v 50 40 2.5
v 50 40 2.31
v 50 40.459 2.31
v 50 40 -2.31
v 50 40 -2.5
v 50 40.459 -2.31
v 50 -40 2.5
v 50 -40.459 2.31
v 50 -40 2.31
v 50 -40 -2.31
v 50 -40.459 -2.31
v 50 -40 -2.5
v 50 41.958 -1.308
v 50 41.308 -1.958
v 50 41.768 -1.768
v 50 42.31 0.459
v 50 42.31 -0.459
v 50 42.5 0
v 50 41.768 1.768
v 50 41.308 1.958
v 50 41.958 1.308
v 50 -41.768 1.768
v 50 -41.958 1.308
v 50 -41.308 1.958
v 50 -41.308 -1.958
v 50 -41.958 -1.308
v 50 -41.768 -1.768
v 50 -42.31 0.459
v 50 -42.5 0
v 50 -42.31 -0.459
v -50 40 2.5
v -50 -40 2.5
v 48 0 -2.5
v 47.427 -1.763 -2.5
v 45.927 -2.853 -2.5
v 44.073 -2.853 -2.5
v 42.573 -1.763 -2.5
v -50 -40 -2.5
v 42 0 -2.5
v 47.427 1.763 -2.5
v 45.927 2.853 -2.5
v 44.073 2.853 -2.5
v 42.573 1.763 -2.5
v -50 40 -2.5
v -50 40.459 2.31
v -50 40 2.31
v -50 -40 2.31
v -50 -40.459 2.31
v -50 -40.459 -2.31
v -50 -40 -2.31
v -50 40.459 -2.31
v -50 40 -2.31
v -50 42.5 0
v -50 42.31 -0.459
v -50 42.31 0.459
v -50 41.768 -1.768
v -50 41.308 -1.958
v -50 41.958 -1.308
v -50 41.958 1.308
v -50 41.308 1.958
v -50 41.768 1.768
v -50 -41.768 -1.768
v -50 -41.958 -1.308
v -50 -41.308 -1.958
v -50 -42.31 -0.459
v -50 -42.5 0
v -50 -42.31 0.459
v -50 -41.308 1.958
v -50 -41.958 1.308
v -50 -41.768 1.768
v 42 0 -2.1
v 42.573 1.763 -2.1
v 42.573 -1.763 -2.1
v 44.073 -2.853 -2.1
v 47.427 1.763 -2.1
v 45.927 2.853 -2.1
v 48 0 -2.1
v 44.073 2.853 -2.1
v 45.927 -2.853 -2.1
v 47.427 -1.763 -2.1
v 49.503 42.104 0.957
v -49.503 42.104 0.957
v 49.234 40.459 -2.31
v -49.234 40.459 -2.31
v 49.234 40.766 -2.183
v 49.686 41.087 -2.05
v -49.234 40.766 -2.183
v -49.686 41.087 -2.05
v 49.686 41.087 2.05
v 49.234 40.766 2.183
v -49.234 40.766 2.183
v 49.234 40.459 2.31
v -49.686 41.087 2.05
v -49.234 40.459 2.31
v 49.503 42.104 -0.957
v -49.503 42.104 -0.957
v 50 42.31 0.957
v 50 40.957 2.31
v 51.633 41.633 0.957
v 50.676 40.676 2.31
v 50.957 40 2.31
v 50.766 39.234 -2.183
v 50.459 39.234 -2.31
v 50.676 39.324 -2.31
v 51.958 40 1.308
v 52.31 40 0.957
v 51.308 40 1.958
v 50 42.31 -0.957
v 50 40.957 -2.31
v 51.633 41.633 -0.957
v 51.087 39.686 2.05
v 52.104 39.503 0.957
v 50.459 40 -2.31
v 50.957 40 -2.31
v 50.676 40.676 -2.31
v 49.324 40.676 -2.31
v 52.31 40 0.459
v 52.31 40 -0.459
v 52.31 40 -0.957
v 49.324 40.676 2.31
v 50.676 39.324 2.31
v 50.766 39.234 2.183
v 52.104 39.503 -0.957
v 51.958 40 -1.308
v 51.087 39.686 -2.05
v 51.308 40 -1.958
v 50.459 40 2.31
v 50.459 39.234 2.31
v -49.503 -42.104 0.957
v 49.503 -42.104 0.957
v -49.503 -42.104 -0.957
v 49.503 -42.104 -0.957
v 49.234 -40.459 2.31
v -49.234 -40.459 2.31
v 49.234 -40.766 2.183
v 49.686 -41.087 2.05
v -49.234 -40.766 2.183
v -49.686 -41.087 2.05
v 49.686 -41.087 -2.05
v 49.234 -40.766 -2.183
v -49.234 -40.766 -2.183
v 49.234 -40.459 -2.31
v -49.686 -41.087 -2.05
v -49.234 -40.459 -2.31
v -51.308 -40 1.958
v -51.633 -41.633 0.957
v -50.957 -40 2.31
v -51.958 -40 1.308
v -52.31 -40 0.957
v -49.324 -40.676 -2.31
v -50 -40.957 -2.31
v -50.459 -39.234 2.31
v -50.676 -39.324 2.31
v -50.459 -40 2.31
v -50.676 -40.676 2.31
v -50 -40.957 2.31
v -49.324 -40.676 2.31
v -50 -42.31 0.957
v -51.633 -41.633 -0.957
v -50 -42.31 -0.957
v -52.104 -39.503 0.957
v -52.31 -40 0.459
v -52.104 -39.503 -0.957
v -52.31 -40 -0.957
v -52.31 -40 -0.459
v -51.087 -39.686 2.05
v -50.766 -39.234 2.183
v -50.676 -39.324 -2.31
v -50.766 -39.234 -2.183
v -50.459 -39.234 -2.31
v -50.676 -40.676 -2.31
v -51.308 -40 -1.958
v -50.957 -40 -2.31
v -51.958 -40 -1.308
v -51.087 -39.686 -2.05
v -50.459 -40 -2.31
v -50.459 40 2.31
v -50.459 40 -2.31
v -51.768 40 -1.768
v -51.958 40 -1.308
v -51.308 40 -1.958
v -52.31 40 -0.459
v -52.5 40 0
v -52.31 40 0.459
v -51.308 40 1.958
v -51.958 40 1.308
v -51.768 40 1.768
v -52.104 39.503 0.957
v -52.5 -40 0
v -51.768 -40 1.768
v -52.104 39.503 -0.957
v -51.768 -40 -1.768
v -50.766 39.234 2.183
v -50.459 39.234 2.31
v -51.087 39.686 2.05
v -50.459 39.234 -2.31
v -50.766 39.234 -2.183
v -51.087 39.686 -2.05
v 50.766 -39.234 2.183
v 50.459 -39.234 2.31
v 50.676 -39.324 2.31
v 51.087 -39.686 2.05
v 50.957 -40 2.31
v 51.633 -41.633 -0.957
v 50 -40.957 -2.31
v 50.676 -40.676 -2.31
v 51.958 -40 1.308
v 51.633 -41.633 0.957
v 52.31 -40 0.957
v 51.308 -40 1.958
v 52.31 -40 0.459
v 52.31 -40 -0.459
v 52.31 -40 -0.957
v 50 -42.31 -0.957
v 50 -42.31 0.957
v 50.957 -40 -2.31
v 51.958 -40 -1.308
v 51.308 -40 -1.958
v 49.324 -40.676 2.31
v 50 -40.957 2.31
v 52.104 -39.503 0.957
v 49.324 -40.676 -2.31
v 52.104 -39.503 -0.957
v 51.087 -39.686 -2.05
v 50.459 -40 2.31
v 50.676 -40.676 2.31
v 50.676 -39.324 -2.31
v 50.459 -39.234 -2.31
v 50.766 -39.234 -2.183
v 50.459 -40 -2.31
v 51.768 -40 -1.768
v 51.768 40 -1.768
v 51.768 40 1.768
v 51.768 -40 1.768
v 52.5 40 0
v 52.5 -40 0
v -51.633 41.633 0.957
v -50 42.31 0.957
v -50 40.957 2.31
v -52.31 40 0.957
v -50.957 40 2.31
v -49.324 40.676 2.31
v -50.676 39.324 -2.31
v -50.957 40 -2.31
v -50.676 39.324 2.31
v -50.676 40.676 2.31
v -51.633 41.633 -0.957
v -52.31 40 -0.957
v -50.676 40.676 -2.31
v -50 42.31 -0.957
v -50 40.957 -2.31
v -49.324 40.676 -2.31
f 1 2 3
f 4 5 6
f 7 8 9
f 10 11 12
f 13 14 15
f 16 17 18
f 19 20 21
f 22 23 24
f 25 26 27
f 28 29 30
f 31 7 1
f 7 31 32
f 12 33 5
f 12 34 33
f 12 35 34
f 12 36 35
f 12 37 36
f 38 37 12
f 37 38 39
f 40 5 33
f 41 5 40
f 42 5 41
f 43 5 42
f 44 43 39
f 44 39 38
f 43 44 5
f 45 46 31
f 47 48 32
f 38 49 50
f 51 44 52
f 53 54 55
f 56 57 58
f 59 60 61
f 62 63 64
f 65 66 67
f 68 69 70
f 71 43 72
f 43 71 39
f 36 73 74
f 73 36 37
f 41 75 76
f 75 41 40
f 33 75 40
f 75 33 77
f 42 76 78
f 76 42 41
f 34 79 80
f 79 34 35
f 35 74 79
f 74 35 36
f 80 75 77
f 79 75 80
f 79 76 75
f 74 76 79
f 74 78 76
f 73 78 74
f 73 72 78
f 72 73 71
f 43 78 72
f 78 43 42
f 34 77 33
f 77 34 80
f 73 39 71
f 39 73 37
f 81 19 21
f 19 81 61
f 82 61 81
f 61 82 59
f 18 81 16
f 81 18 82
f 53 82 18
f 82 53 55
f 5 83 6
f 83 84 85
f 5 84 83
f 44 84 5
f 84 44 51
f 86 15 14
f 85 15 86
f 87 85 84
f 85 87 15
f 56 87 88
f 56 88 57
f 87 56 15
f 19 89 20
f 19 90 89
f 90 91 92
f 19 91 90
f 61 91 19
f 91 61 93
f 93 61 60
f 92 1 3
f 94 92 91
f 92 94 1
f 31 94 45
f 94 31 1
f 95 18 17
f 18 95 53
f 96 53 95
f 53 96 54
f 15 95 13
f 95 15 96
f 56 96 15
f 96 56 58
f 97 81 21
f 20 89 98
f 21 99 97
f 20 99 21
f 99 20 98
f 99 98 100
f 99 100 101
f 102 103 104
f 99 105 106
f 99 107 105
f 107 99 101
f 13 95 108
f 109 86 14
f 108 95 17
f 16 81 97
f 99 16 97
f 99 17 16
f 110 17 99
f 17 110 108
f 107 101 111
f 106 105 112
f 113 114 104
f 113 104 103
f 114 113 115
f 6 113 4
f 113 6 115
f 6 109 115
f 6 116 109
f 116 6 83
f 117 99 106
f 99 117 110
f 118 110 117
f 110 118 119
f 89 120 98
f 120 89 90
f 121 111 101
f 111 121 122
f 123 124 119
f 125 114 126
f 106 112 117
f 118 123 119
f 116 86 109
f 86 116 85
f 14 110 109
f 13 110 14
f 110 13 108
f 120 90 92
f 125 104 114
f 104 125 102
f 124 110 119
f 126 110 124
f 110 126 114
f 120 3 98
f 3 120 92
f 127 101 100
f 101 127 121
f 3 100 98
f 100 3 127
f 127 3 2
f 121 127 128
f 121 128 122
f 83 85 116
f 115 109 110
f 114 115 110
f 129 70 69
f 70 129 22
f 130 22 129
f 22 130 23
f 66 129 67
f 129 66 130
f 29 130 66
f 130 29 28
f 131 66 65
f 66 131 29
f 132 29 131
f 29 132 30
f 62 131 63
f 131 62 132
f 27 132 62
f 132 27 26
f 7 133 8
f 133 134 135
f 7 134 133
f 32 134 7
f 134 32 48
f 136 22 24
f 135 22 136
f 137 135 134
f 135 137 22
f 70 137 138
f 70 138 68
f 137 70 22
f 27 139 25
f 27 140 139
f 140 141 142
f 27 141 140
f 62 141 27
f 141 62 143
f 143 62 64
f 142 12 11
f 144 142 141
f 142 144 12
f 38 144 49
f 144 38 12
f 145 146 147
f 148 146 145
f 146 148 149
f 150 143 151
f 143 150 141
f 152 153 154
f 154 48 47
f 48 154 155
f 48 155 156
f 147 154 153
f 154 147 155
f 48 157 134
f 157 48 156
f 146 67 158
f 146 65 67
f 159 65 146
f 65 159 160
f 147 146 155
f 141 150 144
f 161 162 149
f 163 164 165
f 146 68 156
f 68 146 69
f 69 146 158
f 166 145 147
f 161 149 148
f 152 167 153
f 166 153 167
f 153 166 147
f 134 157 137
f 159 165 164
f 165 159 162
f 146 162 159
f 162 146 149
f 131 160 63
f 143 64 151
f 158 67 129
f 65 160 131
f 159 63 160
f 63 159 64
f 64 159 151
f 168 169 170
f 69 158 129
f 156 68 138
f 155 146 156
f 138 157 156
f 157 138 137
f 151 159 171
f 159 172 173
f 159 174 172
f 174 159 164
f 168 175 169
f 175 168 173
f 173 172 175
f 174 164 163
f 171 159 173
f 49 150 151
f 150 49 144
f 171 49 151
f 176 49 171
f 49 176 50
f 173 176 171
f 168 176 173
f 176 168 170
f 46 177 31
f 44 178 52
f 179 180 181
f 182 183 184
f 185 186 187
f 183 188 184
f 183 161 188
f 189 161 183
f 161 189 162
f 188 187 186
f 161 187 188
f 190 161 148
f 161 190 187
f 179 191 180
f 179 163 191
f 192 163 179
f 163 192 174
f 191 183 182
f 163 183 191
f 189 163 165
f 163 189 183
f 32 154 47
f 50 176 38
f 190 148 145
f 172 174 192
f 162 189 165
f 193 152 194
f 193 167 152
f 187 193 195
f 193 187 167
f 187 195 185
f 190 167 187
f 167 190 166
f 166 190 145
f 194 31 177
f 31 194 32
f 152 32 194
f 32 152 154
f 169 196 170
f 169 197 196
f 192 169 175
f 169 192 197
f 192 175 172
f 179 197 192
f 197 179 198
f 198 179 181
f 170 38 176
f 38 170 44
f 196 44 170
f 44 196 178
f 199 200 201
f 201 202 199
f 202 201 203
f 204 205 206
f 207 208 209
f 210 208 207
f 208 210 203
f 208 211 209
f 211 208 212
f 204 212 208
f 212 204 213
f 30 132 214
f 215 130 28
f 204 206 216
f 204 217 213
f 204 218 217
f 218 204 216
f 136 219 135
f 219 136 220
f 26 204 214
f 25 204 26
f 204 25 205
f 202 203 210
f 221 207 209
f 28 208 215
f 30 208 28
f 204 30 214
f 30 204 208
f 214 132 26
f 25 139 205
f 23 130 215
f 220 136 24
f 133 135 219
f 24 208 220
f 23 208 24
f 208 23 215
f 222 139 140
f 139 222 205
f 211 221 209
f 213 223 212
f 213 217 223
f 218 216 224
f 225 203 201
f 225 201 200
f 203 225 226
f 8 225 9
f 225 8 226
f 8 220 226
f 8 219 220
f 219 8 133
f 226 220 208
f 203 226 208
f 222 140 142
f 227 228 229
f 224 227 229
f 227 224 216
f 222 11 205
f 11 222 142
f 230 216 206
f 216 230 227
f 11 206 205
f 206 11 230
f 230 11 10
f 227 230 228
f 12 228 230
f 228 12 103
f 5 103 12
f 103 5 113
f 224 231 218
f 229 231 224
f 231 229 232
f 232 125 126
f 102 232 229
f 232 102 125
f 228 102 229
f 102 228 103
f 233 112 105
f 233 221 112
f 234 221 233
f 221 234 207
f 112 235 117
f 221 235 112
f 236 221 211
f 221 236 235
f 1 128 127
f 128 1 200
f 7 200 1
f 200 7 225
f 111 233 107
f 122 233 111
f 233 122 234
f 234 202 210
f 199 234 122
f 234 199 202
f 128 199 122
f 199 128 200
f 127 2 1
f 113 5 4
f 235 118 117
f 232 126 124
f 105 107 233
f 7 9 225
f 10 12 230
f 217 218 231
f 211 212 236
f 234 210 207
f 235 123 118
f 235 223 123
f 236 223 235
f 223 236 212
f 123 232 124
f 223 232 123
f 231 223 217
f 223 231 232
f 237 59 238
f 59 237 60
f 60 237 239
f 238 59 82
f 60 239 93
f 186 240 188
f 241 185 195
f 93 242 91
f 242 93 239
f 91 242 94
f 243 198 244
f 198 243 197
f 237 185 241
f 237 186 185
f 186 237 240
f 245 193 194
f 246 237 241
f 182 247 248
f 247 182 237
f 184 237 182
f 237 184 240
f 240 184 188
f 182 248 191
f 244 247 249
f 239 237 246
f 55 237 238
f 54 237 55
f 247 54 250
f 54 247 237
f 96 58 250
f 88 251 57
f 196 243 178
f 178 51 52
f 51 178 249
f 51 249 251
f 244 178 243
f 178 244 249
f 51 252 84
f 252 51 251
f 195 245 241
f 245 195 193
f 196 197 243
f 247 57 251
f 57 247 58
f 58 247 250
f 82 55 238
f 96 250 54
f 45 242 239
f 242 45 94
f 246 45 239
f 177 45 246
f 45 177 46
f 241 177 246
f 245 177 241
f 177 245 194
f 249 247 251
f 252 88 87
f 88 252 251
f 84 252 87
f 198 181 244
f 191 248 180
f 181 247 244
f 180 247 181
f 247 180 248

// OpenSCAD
use <Write.scad>
width = 5;
small = width/2;

difference() {
	cube([100,80,width], center=true);

	
	translate([40,0,small])
	rotate([0,0,90])
		write("goodboard",center=true,space=2.5);

	translate([45,0,small])
	rotate([0,0,90])
		write("made in cascadia",h=1,center=true,space=2.5);

	translate([45,0,-small-0.1])
		cylinder(0.5,3,3);
}

for (i = [1,-1]) {
	rotate([0,90,0])
	translate([0,40*i,0])
		cylinder(100,small,small,true);
	translate([50*i, 40*i,0])
		sphere(small);
}
for (i = [-1,1]) {
	rotate([90,90,0])
	translate([0,50*i,0])
		cylinder(80,small,small,true);
	translate([-50*i, 40*i])
		sphere(small);
}
